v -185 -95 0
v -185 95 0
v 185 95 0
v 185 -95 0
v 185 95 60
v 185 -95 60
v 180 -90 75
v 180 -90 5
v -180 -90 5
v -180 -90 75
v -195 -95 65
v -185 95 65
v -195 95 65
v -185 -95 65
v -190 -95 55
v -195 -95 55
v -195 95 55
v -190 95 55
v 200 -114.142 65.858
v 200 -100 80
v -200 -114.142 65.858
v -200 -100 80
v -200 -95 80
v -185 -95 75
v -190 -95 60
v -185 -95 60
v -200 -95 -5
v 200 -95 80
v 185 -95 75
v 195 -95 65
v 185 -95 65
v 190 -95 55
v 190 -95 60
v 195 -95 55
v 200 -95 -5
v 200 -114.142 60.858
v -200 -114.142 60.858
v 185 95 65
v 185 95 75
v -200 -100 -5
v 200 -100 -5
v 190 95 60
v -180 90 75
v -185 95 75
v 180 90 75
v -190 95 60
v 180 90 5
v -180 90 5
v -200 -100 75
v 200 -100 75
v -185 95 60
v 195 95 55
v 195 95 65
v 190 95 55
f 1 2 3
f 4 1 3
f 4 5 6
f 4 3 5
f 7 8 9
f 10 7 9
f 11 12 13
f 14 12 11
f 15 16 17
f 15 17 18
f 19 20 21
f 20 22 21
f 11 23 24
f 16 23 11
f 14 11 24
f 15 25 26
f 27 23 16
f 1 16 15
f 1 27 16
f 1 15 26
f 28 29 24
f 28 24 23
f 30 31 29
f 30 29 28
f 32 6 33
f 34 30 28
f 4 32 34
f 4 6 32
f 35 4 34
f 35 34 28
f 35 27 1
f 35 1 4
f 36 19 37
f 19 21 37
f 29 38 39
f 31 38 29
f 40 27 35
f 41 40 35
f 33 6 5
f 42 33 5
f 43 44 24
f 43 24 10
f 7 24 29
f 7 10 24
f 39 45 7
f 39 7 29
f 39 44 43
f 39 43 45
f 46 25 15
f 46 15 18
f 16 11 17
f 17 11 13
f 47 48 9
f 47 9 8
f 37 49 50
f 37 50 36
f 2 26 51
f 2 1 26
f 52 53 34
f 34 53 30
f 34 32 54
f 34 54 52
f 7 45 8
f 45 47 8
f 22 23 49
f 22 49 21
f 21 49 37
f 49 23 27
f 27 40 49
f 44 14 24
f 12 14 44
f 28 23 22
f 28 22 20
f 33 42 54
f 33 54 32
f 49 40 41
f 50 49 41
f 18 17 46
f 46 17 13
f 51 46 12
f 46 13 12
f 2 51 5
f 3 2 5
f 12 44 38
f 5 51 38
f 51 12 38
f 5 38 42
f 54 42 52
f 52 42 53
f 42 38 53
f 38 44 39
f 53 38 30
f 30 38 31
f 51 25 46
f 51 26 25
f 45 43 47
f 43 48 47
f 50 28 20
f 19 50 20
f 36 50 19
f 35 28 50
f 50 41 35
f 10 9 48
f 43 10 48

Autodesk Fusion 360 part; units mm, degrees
sketch "Sketch1" plane through (0, 0, 0) normal (0, 0, 1) x (1, 0, 0)
  line L0 (185, -95) -> (-185, -95)
  line L1 (-185, -95) -> (-185, 95)
  line L2 (-185, 95) -> (185, 95)
  line L3 (185, 95) -> (185, -95)
  line L4 (185, -95) -> (-185, 95) construction
  line L5 (-185, -95) -> (185, 95) construction
  line L6 (180, -90) -> (-180, -90)
  line L7 (-180, -90) -> (-180, 90)
  line L8 (-180, 90) -> (180, 90)
  line L9 (180, 90) -> (180, -90)
  line L10 (180, -90) -> (-180, 90) construction
  line L11 (-180, -90) -> (180, 90) construction
  line L12 (-185, -95) -> (-200, -95)
  line L13 (-200, -95) -> (-200, -100)
  line L14 (-200, -100) -> (200, -100)
  line L15 (185, -95) -> (200, -95)
  line L16 (200, -95) -> (200, -100)
  dimension "d1" = 370
  dimension "d2" = 190
  dimension "d3" = 360
  dimension "d4" = 180
  dimension "d5" = 400
  dimension "d6" = 15
  dimension "d7" = 5
extrude "Extrude1" add sketch "Sketch1" along normal blind 75 contours L0 L1 L2 L3
extrude "Extrude2" add sketch "Sketch1" along normal blind 5 contours L6 L7 L8 L9
extrude "Extrude3" add sketch "Sketch1" along normal blind 80 and the other way blind 5 contours L0 L12 L13 L14 L15 L16
sketch "Sketch9" plane through (185, 0, 0) normal (1, 0, 0) x (0, 1, 0)
  line L0 (-95, 0) -> (95, 0)
  line L1 (95, 0) -> (95, 75)
  line L2 (95, 75) -> (-95, 75)
  line L3 (-95, 75) -> (-95, 0)
  line L4 (0, 0) -> (0, 60) construction
  line L5 (0, 60) -> (95, 60) construction
  line L6 (0, 60) -> (-95, 60) construction
  line L7 (-95, 60) -> (95, 60)
  line L8 (95, 60) -> (95, 65)
  line L9 (95, 65) -> (-95, 65)
  line L10 (-95, 65) -> (-95, 60)
  dimension "d48" = 5
  dimension "d49" = 60
extrude "Extrude10" add sketch "Sketch9" along normal blind 10 contours L1 L3 L7 L8 L9 L10
sketch "Sketch10" plane through (0, 0, 60) normal (0, 0, -1) x (1, 0, 0)
  line L0 (185, 95) -> (185, -95)
  line L1 (185, -95) -> (195, -95)
  line L2 (195, -95) -> (195, 95)
  line L3 (195, 95) -> (185, 95)
  line L4 (195, -95) -> (190, -95)
  line L5 (190, -95) -> (190, 95)
  line L6 (190, 95) -> (195, 95)
  line L7 (195, 95) -> (195, -95)
extrude "Extrude11" add sketch "Sketch10" along normal blind 5 contours L1 L2 L3 L4 L5 L6 L7
sketch "Sketch11" plane through (-185, 0, 0) normal (-1, 0, 0) x (0, -1, 0)
  line L0 (-95, 0) -> (95, 0)
  line L1 (95, 0) -> (95, 75)
  line L2 (95, 75) -> (-95, 75)
  line L3 (-95, 75) -> (-95, 0)
  line L4 (0, 0) -> (0, 60) construction
  line L5 (95, 60) -> (-95, 60)
  line L6 (-95, 60) -> (-95, 65)
  line L7 (-95, 65) -> (95, 65)
  line L8 (95, 65) -> (95, 60)
  dimension "d54" = 5
  dimension "d55" = 190
  dimension "d56" = 60
extrude "Extrude12" add sketch "Sketch11" along normal blind 10 contours L1 L3 L5 L6 L7 L8
sketch "Sketch13" plane through (0, 0, 60) normal (0, 0, -1) x (1, 0, 0)
  line L0 (-185, -95) -> (-185, 95)
  line L1 (-185, 95) -> (-195, 95)
  line L2 (-195, 95) -> (-195, -95)
  line L3 (-195, -95) -> (-185, -95)
  line L4 (-190, -95) -> (-195, -95)
  line L5 (-195, -95) -> (-195, 95)
  line L6 (-195, 95) -> (-190, 95)
  line L7 (-190, 95) -> (-190, -95)
extrude "Extrude13" add sketch "Sketch13" along normal blind 5 contours L1 L2 L3 L4 L5 L6 L7
sketch "Sketch14" plane through (0, 0, 0) normal (1, 0, 0) x (0, 1, 0)
  curve L0
  line L1 (-100, 80) -> (-114.1421, 65.8579)
  line L2 (-100, 80) -> (-120, 80) construction
  line L3 (-114.1421, 65.8579) -> (-114.1421, 60.8579)
  line L4 (-100, 80) -> (-100, 75)
  line L5 (-100, 75) -> (-114.1421, 60.8579)
  dimension "d61" = 45
  dimension "d62" = 20
  dimension "d63" = 5
extrude "Extrude14" add sketch "Sketch14" along normal mid plane 400
